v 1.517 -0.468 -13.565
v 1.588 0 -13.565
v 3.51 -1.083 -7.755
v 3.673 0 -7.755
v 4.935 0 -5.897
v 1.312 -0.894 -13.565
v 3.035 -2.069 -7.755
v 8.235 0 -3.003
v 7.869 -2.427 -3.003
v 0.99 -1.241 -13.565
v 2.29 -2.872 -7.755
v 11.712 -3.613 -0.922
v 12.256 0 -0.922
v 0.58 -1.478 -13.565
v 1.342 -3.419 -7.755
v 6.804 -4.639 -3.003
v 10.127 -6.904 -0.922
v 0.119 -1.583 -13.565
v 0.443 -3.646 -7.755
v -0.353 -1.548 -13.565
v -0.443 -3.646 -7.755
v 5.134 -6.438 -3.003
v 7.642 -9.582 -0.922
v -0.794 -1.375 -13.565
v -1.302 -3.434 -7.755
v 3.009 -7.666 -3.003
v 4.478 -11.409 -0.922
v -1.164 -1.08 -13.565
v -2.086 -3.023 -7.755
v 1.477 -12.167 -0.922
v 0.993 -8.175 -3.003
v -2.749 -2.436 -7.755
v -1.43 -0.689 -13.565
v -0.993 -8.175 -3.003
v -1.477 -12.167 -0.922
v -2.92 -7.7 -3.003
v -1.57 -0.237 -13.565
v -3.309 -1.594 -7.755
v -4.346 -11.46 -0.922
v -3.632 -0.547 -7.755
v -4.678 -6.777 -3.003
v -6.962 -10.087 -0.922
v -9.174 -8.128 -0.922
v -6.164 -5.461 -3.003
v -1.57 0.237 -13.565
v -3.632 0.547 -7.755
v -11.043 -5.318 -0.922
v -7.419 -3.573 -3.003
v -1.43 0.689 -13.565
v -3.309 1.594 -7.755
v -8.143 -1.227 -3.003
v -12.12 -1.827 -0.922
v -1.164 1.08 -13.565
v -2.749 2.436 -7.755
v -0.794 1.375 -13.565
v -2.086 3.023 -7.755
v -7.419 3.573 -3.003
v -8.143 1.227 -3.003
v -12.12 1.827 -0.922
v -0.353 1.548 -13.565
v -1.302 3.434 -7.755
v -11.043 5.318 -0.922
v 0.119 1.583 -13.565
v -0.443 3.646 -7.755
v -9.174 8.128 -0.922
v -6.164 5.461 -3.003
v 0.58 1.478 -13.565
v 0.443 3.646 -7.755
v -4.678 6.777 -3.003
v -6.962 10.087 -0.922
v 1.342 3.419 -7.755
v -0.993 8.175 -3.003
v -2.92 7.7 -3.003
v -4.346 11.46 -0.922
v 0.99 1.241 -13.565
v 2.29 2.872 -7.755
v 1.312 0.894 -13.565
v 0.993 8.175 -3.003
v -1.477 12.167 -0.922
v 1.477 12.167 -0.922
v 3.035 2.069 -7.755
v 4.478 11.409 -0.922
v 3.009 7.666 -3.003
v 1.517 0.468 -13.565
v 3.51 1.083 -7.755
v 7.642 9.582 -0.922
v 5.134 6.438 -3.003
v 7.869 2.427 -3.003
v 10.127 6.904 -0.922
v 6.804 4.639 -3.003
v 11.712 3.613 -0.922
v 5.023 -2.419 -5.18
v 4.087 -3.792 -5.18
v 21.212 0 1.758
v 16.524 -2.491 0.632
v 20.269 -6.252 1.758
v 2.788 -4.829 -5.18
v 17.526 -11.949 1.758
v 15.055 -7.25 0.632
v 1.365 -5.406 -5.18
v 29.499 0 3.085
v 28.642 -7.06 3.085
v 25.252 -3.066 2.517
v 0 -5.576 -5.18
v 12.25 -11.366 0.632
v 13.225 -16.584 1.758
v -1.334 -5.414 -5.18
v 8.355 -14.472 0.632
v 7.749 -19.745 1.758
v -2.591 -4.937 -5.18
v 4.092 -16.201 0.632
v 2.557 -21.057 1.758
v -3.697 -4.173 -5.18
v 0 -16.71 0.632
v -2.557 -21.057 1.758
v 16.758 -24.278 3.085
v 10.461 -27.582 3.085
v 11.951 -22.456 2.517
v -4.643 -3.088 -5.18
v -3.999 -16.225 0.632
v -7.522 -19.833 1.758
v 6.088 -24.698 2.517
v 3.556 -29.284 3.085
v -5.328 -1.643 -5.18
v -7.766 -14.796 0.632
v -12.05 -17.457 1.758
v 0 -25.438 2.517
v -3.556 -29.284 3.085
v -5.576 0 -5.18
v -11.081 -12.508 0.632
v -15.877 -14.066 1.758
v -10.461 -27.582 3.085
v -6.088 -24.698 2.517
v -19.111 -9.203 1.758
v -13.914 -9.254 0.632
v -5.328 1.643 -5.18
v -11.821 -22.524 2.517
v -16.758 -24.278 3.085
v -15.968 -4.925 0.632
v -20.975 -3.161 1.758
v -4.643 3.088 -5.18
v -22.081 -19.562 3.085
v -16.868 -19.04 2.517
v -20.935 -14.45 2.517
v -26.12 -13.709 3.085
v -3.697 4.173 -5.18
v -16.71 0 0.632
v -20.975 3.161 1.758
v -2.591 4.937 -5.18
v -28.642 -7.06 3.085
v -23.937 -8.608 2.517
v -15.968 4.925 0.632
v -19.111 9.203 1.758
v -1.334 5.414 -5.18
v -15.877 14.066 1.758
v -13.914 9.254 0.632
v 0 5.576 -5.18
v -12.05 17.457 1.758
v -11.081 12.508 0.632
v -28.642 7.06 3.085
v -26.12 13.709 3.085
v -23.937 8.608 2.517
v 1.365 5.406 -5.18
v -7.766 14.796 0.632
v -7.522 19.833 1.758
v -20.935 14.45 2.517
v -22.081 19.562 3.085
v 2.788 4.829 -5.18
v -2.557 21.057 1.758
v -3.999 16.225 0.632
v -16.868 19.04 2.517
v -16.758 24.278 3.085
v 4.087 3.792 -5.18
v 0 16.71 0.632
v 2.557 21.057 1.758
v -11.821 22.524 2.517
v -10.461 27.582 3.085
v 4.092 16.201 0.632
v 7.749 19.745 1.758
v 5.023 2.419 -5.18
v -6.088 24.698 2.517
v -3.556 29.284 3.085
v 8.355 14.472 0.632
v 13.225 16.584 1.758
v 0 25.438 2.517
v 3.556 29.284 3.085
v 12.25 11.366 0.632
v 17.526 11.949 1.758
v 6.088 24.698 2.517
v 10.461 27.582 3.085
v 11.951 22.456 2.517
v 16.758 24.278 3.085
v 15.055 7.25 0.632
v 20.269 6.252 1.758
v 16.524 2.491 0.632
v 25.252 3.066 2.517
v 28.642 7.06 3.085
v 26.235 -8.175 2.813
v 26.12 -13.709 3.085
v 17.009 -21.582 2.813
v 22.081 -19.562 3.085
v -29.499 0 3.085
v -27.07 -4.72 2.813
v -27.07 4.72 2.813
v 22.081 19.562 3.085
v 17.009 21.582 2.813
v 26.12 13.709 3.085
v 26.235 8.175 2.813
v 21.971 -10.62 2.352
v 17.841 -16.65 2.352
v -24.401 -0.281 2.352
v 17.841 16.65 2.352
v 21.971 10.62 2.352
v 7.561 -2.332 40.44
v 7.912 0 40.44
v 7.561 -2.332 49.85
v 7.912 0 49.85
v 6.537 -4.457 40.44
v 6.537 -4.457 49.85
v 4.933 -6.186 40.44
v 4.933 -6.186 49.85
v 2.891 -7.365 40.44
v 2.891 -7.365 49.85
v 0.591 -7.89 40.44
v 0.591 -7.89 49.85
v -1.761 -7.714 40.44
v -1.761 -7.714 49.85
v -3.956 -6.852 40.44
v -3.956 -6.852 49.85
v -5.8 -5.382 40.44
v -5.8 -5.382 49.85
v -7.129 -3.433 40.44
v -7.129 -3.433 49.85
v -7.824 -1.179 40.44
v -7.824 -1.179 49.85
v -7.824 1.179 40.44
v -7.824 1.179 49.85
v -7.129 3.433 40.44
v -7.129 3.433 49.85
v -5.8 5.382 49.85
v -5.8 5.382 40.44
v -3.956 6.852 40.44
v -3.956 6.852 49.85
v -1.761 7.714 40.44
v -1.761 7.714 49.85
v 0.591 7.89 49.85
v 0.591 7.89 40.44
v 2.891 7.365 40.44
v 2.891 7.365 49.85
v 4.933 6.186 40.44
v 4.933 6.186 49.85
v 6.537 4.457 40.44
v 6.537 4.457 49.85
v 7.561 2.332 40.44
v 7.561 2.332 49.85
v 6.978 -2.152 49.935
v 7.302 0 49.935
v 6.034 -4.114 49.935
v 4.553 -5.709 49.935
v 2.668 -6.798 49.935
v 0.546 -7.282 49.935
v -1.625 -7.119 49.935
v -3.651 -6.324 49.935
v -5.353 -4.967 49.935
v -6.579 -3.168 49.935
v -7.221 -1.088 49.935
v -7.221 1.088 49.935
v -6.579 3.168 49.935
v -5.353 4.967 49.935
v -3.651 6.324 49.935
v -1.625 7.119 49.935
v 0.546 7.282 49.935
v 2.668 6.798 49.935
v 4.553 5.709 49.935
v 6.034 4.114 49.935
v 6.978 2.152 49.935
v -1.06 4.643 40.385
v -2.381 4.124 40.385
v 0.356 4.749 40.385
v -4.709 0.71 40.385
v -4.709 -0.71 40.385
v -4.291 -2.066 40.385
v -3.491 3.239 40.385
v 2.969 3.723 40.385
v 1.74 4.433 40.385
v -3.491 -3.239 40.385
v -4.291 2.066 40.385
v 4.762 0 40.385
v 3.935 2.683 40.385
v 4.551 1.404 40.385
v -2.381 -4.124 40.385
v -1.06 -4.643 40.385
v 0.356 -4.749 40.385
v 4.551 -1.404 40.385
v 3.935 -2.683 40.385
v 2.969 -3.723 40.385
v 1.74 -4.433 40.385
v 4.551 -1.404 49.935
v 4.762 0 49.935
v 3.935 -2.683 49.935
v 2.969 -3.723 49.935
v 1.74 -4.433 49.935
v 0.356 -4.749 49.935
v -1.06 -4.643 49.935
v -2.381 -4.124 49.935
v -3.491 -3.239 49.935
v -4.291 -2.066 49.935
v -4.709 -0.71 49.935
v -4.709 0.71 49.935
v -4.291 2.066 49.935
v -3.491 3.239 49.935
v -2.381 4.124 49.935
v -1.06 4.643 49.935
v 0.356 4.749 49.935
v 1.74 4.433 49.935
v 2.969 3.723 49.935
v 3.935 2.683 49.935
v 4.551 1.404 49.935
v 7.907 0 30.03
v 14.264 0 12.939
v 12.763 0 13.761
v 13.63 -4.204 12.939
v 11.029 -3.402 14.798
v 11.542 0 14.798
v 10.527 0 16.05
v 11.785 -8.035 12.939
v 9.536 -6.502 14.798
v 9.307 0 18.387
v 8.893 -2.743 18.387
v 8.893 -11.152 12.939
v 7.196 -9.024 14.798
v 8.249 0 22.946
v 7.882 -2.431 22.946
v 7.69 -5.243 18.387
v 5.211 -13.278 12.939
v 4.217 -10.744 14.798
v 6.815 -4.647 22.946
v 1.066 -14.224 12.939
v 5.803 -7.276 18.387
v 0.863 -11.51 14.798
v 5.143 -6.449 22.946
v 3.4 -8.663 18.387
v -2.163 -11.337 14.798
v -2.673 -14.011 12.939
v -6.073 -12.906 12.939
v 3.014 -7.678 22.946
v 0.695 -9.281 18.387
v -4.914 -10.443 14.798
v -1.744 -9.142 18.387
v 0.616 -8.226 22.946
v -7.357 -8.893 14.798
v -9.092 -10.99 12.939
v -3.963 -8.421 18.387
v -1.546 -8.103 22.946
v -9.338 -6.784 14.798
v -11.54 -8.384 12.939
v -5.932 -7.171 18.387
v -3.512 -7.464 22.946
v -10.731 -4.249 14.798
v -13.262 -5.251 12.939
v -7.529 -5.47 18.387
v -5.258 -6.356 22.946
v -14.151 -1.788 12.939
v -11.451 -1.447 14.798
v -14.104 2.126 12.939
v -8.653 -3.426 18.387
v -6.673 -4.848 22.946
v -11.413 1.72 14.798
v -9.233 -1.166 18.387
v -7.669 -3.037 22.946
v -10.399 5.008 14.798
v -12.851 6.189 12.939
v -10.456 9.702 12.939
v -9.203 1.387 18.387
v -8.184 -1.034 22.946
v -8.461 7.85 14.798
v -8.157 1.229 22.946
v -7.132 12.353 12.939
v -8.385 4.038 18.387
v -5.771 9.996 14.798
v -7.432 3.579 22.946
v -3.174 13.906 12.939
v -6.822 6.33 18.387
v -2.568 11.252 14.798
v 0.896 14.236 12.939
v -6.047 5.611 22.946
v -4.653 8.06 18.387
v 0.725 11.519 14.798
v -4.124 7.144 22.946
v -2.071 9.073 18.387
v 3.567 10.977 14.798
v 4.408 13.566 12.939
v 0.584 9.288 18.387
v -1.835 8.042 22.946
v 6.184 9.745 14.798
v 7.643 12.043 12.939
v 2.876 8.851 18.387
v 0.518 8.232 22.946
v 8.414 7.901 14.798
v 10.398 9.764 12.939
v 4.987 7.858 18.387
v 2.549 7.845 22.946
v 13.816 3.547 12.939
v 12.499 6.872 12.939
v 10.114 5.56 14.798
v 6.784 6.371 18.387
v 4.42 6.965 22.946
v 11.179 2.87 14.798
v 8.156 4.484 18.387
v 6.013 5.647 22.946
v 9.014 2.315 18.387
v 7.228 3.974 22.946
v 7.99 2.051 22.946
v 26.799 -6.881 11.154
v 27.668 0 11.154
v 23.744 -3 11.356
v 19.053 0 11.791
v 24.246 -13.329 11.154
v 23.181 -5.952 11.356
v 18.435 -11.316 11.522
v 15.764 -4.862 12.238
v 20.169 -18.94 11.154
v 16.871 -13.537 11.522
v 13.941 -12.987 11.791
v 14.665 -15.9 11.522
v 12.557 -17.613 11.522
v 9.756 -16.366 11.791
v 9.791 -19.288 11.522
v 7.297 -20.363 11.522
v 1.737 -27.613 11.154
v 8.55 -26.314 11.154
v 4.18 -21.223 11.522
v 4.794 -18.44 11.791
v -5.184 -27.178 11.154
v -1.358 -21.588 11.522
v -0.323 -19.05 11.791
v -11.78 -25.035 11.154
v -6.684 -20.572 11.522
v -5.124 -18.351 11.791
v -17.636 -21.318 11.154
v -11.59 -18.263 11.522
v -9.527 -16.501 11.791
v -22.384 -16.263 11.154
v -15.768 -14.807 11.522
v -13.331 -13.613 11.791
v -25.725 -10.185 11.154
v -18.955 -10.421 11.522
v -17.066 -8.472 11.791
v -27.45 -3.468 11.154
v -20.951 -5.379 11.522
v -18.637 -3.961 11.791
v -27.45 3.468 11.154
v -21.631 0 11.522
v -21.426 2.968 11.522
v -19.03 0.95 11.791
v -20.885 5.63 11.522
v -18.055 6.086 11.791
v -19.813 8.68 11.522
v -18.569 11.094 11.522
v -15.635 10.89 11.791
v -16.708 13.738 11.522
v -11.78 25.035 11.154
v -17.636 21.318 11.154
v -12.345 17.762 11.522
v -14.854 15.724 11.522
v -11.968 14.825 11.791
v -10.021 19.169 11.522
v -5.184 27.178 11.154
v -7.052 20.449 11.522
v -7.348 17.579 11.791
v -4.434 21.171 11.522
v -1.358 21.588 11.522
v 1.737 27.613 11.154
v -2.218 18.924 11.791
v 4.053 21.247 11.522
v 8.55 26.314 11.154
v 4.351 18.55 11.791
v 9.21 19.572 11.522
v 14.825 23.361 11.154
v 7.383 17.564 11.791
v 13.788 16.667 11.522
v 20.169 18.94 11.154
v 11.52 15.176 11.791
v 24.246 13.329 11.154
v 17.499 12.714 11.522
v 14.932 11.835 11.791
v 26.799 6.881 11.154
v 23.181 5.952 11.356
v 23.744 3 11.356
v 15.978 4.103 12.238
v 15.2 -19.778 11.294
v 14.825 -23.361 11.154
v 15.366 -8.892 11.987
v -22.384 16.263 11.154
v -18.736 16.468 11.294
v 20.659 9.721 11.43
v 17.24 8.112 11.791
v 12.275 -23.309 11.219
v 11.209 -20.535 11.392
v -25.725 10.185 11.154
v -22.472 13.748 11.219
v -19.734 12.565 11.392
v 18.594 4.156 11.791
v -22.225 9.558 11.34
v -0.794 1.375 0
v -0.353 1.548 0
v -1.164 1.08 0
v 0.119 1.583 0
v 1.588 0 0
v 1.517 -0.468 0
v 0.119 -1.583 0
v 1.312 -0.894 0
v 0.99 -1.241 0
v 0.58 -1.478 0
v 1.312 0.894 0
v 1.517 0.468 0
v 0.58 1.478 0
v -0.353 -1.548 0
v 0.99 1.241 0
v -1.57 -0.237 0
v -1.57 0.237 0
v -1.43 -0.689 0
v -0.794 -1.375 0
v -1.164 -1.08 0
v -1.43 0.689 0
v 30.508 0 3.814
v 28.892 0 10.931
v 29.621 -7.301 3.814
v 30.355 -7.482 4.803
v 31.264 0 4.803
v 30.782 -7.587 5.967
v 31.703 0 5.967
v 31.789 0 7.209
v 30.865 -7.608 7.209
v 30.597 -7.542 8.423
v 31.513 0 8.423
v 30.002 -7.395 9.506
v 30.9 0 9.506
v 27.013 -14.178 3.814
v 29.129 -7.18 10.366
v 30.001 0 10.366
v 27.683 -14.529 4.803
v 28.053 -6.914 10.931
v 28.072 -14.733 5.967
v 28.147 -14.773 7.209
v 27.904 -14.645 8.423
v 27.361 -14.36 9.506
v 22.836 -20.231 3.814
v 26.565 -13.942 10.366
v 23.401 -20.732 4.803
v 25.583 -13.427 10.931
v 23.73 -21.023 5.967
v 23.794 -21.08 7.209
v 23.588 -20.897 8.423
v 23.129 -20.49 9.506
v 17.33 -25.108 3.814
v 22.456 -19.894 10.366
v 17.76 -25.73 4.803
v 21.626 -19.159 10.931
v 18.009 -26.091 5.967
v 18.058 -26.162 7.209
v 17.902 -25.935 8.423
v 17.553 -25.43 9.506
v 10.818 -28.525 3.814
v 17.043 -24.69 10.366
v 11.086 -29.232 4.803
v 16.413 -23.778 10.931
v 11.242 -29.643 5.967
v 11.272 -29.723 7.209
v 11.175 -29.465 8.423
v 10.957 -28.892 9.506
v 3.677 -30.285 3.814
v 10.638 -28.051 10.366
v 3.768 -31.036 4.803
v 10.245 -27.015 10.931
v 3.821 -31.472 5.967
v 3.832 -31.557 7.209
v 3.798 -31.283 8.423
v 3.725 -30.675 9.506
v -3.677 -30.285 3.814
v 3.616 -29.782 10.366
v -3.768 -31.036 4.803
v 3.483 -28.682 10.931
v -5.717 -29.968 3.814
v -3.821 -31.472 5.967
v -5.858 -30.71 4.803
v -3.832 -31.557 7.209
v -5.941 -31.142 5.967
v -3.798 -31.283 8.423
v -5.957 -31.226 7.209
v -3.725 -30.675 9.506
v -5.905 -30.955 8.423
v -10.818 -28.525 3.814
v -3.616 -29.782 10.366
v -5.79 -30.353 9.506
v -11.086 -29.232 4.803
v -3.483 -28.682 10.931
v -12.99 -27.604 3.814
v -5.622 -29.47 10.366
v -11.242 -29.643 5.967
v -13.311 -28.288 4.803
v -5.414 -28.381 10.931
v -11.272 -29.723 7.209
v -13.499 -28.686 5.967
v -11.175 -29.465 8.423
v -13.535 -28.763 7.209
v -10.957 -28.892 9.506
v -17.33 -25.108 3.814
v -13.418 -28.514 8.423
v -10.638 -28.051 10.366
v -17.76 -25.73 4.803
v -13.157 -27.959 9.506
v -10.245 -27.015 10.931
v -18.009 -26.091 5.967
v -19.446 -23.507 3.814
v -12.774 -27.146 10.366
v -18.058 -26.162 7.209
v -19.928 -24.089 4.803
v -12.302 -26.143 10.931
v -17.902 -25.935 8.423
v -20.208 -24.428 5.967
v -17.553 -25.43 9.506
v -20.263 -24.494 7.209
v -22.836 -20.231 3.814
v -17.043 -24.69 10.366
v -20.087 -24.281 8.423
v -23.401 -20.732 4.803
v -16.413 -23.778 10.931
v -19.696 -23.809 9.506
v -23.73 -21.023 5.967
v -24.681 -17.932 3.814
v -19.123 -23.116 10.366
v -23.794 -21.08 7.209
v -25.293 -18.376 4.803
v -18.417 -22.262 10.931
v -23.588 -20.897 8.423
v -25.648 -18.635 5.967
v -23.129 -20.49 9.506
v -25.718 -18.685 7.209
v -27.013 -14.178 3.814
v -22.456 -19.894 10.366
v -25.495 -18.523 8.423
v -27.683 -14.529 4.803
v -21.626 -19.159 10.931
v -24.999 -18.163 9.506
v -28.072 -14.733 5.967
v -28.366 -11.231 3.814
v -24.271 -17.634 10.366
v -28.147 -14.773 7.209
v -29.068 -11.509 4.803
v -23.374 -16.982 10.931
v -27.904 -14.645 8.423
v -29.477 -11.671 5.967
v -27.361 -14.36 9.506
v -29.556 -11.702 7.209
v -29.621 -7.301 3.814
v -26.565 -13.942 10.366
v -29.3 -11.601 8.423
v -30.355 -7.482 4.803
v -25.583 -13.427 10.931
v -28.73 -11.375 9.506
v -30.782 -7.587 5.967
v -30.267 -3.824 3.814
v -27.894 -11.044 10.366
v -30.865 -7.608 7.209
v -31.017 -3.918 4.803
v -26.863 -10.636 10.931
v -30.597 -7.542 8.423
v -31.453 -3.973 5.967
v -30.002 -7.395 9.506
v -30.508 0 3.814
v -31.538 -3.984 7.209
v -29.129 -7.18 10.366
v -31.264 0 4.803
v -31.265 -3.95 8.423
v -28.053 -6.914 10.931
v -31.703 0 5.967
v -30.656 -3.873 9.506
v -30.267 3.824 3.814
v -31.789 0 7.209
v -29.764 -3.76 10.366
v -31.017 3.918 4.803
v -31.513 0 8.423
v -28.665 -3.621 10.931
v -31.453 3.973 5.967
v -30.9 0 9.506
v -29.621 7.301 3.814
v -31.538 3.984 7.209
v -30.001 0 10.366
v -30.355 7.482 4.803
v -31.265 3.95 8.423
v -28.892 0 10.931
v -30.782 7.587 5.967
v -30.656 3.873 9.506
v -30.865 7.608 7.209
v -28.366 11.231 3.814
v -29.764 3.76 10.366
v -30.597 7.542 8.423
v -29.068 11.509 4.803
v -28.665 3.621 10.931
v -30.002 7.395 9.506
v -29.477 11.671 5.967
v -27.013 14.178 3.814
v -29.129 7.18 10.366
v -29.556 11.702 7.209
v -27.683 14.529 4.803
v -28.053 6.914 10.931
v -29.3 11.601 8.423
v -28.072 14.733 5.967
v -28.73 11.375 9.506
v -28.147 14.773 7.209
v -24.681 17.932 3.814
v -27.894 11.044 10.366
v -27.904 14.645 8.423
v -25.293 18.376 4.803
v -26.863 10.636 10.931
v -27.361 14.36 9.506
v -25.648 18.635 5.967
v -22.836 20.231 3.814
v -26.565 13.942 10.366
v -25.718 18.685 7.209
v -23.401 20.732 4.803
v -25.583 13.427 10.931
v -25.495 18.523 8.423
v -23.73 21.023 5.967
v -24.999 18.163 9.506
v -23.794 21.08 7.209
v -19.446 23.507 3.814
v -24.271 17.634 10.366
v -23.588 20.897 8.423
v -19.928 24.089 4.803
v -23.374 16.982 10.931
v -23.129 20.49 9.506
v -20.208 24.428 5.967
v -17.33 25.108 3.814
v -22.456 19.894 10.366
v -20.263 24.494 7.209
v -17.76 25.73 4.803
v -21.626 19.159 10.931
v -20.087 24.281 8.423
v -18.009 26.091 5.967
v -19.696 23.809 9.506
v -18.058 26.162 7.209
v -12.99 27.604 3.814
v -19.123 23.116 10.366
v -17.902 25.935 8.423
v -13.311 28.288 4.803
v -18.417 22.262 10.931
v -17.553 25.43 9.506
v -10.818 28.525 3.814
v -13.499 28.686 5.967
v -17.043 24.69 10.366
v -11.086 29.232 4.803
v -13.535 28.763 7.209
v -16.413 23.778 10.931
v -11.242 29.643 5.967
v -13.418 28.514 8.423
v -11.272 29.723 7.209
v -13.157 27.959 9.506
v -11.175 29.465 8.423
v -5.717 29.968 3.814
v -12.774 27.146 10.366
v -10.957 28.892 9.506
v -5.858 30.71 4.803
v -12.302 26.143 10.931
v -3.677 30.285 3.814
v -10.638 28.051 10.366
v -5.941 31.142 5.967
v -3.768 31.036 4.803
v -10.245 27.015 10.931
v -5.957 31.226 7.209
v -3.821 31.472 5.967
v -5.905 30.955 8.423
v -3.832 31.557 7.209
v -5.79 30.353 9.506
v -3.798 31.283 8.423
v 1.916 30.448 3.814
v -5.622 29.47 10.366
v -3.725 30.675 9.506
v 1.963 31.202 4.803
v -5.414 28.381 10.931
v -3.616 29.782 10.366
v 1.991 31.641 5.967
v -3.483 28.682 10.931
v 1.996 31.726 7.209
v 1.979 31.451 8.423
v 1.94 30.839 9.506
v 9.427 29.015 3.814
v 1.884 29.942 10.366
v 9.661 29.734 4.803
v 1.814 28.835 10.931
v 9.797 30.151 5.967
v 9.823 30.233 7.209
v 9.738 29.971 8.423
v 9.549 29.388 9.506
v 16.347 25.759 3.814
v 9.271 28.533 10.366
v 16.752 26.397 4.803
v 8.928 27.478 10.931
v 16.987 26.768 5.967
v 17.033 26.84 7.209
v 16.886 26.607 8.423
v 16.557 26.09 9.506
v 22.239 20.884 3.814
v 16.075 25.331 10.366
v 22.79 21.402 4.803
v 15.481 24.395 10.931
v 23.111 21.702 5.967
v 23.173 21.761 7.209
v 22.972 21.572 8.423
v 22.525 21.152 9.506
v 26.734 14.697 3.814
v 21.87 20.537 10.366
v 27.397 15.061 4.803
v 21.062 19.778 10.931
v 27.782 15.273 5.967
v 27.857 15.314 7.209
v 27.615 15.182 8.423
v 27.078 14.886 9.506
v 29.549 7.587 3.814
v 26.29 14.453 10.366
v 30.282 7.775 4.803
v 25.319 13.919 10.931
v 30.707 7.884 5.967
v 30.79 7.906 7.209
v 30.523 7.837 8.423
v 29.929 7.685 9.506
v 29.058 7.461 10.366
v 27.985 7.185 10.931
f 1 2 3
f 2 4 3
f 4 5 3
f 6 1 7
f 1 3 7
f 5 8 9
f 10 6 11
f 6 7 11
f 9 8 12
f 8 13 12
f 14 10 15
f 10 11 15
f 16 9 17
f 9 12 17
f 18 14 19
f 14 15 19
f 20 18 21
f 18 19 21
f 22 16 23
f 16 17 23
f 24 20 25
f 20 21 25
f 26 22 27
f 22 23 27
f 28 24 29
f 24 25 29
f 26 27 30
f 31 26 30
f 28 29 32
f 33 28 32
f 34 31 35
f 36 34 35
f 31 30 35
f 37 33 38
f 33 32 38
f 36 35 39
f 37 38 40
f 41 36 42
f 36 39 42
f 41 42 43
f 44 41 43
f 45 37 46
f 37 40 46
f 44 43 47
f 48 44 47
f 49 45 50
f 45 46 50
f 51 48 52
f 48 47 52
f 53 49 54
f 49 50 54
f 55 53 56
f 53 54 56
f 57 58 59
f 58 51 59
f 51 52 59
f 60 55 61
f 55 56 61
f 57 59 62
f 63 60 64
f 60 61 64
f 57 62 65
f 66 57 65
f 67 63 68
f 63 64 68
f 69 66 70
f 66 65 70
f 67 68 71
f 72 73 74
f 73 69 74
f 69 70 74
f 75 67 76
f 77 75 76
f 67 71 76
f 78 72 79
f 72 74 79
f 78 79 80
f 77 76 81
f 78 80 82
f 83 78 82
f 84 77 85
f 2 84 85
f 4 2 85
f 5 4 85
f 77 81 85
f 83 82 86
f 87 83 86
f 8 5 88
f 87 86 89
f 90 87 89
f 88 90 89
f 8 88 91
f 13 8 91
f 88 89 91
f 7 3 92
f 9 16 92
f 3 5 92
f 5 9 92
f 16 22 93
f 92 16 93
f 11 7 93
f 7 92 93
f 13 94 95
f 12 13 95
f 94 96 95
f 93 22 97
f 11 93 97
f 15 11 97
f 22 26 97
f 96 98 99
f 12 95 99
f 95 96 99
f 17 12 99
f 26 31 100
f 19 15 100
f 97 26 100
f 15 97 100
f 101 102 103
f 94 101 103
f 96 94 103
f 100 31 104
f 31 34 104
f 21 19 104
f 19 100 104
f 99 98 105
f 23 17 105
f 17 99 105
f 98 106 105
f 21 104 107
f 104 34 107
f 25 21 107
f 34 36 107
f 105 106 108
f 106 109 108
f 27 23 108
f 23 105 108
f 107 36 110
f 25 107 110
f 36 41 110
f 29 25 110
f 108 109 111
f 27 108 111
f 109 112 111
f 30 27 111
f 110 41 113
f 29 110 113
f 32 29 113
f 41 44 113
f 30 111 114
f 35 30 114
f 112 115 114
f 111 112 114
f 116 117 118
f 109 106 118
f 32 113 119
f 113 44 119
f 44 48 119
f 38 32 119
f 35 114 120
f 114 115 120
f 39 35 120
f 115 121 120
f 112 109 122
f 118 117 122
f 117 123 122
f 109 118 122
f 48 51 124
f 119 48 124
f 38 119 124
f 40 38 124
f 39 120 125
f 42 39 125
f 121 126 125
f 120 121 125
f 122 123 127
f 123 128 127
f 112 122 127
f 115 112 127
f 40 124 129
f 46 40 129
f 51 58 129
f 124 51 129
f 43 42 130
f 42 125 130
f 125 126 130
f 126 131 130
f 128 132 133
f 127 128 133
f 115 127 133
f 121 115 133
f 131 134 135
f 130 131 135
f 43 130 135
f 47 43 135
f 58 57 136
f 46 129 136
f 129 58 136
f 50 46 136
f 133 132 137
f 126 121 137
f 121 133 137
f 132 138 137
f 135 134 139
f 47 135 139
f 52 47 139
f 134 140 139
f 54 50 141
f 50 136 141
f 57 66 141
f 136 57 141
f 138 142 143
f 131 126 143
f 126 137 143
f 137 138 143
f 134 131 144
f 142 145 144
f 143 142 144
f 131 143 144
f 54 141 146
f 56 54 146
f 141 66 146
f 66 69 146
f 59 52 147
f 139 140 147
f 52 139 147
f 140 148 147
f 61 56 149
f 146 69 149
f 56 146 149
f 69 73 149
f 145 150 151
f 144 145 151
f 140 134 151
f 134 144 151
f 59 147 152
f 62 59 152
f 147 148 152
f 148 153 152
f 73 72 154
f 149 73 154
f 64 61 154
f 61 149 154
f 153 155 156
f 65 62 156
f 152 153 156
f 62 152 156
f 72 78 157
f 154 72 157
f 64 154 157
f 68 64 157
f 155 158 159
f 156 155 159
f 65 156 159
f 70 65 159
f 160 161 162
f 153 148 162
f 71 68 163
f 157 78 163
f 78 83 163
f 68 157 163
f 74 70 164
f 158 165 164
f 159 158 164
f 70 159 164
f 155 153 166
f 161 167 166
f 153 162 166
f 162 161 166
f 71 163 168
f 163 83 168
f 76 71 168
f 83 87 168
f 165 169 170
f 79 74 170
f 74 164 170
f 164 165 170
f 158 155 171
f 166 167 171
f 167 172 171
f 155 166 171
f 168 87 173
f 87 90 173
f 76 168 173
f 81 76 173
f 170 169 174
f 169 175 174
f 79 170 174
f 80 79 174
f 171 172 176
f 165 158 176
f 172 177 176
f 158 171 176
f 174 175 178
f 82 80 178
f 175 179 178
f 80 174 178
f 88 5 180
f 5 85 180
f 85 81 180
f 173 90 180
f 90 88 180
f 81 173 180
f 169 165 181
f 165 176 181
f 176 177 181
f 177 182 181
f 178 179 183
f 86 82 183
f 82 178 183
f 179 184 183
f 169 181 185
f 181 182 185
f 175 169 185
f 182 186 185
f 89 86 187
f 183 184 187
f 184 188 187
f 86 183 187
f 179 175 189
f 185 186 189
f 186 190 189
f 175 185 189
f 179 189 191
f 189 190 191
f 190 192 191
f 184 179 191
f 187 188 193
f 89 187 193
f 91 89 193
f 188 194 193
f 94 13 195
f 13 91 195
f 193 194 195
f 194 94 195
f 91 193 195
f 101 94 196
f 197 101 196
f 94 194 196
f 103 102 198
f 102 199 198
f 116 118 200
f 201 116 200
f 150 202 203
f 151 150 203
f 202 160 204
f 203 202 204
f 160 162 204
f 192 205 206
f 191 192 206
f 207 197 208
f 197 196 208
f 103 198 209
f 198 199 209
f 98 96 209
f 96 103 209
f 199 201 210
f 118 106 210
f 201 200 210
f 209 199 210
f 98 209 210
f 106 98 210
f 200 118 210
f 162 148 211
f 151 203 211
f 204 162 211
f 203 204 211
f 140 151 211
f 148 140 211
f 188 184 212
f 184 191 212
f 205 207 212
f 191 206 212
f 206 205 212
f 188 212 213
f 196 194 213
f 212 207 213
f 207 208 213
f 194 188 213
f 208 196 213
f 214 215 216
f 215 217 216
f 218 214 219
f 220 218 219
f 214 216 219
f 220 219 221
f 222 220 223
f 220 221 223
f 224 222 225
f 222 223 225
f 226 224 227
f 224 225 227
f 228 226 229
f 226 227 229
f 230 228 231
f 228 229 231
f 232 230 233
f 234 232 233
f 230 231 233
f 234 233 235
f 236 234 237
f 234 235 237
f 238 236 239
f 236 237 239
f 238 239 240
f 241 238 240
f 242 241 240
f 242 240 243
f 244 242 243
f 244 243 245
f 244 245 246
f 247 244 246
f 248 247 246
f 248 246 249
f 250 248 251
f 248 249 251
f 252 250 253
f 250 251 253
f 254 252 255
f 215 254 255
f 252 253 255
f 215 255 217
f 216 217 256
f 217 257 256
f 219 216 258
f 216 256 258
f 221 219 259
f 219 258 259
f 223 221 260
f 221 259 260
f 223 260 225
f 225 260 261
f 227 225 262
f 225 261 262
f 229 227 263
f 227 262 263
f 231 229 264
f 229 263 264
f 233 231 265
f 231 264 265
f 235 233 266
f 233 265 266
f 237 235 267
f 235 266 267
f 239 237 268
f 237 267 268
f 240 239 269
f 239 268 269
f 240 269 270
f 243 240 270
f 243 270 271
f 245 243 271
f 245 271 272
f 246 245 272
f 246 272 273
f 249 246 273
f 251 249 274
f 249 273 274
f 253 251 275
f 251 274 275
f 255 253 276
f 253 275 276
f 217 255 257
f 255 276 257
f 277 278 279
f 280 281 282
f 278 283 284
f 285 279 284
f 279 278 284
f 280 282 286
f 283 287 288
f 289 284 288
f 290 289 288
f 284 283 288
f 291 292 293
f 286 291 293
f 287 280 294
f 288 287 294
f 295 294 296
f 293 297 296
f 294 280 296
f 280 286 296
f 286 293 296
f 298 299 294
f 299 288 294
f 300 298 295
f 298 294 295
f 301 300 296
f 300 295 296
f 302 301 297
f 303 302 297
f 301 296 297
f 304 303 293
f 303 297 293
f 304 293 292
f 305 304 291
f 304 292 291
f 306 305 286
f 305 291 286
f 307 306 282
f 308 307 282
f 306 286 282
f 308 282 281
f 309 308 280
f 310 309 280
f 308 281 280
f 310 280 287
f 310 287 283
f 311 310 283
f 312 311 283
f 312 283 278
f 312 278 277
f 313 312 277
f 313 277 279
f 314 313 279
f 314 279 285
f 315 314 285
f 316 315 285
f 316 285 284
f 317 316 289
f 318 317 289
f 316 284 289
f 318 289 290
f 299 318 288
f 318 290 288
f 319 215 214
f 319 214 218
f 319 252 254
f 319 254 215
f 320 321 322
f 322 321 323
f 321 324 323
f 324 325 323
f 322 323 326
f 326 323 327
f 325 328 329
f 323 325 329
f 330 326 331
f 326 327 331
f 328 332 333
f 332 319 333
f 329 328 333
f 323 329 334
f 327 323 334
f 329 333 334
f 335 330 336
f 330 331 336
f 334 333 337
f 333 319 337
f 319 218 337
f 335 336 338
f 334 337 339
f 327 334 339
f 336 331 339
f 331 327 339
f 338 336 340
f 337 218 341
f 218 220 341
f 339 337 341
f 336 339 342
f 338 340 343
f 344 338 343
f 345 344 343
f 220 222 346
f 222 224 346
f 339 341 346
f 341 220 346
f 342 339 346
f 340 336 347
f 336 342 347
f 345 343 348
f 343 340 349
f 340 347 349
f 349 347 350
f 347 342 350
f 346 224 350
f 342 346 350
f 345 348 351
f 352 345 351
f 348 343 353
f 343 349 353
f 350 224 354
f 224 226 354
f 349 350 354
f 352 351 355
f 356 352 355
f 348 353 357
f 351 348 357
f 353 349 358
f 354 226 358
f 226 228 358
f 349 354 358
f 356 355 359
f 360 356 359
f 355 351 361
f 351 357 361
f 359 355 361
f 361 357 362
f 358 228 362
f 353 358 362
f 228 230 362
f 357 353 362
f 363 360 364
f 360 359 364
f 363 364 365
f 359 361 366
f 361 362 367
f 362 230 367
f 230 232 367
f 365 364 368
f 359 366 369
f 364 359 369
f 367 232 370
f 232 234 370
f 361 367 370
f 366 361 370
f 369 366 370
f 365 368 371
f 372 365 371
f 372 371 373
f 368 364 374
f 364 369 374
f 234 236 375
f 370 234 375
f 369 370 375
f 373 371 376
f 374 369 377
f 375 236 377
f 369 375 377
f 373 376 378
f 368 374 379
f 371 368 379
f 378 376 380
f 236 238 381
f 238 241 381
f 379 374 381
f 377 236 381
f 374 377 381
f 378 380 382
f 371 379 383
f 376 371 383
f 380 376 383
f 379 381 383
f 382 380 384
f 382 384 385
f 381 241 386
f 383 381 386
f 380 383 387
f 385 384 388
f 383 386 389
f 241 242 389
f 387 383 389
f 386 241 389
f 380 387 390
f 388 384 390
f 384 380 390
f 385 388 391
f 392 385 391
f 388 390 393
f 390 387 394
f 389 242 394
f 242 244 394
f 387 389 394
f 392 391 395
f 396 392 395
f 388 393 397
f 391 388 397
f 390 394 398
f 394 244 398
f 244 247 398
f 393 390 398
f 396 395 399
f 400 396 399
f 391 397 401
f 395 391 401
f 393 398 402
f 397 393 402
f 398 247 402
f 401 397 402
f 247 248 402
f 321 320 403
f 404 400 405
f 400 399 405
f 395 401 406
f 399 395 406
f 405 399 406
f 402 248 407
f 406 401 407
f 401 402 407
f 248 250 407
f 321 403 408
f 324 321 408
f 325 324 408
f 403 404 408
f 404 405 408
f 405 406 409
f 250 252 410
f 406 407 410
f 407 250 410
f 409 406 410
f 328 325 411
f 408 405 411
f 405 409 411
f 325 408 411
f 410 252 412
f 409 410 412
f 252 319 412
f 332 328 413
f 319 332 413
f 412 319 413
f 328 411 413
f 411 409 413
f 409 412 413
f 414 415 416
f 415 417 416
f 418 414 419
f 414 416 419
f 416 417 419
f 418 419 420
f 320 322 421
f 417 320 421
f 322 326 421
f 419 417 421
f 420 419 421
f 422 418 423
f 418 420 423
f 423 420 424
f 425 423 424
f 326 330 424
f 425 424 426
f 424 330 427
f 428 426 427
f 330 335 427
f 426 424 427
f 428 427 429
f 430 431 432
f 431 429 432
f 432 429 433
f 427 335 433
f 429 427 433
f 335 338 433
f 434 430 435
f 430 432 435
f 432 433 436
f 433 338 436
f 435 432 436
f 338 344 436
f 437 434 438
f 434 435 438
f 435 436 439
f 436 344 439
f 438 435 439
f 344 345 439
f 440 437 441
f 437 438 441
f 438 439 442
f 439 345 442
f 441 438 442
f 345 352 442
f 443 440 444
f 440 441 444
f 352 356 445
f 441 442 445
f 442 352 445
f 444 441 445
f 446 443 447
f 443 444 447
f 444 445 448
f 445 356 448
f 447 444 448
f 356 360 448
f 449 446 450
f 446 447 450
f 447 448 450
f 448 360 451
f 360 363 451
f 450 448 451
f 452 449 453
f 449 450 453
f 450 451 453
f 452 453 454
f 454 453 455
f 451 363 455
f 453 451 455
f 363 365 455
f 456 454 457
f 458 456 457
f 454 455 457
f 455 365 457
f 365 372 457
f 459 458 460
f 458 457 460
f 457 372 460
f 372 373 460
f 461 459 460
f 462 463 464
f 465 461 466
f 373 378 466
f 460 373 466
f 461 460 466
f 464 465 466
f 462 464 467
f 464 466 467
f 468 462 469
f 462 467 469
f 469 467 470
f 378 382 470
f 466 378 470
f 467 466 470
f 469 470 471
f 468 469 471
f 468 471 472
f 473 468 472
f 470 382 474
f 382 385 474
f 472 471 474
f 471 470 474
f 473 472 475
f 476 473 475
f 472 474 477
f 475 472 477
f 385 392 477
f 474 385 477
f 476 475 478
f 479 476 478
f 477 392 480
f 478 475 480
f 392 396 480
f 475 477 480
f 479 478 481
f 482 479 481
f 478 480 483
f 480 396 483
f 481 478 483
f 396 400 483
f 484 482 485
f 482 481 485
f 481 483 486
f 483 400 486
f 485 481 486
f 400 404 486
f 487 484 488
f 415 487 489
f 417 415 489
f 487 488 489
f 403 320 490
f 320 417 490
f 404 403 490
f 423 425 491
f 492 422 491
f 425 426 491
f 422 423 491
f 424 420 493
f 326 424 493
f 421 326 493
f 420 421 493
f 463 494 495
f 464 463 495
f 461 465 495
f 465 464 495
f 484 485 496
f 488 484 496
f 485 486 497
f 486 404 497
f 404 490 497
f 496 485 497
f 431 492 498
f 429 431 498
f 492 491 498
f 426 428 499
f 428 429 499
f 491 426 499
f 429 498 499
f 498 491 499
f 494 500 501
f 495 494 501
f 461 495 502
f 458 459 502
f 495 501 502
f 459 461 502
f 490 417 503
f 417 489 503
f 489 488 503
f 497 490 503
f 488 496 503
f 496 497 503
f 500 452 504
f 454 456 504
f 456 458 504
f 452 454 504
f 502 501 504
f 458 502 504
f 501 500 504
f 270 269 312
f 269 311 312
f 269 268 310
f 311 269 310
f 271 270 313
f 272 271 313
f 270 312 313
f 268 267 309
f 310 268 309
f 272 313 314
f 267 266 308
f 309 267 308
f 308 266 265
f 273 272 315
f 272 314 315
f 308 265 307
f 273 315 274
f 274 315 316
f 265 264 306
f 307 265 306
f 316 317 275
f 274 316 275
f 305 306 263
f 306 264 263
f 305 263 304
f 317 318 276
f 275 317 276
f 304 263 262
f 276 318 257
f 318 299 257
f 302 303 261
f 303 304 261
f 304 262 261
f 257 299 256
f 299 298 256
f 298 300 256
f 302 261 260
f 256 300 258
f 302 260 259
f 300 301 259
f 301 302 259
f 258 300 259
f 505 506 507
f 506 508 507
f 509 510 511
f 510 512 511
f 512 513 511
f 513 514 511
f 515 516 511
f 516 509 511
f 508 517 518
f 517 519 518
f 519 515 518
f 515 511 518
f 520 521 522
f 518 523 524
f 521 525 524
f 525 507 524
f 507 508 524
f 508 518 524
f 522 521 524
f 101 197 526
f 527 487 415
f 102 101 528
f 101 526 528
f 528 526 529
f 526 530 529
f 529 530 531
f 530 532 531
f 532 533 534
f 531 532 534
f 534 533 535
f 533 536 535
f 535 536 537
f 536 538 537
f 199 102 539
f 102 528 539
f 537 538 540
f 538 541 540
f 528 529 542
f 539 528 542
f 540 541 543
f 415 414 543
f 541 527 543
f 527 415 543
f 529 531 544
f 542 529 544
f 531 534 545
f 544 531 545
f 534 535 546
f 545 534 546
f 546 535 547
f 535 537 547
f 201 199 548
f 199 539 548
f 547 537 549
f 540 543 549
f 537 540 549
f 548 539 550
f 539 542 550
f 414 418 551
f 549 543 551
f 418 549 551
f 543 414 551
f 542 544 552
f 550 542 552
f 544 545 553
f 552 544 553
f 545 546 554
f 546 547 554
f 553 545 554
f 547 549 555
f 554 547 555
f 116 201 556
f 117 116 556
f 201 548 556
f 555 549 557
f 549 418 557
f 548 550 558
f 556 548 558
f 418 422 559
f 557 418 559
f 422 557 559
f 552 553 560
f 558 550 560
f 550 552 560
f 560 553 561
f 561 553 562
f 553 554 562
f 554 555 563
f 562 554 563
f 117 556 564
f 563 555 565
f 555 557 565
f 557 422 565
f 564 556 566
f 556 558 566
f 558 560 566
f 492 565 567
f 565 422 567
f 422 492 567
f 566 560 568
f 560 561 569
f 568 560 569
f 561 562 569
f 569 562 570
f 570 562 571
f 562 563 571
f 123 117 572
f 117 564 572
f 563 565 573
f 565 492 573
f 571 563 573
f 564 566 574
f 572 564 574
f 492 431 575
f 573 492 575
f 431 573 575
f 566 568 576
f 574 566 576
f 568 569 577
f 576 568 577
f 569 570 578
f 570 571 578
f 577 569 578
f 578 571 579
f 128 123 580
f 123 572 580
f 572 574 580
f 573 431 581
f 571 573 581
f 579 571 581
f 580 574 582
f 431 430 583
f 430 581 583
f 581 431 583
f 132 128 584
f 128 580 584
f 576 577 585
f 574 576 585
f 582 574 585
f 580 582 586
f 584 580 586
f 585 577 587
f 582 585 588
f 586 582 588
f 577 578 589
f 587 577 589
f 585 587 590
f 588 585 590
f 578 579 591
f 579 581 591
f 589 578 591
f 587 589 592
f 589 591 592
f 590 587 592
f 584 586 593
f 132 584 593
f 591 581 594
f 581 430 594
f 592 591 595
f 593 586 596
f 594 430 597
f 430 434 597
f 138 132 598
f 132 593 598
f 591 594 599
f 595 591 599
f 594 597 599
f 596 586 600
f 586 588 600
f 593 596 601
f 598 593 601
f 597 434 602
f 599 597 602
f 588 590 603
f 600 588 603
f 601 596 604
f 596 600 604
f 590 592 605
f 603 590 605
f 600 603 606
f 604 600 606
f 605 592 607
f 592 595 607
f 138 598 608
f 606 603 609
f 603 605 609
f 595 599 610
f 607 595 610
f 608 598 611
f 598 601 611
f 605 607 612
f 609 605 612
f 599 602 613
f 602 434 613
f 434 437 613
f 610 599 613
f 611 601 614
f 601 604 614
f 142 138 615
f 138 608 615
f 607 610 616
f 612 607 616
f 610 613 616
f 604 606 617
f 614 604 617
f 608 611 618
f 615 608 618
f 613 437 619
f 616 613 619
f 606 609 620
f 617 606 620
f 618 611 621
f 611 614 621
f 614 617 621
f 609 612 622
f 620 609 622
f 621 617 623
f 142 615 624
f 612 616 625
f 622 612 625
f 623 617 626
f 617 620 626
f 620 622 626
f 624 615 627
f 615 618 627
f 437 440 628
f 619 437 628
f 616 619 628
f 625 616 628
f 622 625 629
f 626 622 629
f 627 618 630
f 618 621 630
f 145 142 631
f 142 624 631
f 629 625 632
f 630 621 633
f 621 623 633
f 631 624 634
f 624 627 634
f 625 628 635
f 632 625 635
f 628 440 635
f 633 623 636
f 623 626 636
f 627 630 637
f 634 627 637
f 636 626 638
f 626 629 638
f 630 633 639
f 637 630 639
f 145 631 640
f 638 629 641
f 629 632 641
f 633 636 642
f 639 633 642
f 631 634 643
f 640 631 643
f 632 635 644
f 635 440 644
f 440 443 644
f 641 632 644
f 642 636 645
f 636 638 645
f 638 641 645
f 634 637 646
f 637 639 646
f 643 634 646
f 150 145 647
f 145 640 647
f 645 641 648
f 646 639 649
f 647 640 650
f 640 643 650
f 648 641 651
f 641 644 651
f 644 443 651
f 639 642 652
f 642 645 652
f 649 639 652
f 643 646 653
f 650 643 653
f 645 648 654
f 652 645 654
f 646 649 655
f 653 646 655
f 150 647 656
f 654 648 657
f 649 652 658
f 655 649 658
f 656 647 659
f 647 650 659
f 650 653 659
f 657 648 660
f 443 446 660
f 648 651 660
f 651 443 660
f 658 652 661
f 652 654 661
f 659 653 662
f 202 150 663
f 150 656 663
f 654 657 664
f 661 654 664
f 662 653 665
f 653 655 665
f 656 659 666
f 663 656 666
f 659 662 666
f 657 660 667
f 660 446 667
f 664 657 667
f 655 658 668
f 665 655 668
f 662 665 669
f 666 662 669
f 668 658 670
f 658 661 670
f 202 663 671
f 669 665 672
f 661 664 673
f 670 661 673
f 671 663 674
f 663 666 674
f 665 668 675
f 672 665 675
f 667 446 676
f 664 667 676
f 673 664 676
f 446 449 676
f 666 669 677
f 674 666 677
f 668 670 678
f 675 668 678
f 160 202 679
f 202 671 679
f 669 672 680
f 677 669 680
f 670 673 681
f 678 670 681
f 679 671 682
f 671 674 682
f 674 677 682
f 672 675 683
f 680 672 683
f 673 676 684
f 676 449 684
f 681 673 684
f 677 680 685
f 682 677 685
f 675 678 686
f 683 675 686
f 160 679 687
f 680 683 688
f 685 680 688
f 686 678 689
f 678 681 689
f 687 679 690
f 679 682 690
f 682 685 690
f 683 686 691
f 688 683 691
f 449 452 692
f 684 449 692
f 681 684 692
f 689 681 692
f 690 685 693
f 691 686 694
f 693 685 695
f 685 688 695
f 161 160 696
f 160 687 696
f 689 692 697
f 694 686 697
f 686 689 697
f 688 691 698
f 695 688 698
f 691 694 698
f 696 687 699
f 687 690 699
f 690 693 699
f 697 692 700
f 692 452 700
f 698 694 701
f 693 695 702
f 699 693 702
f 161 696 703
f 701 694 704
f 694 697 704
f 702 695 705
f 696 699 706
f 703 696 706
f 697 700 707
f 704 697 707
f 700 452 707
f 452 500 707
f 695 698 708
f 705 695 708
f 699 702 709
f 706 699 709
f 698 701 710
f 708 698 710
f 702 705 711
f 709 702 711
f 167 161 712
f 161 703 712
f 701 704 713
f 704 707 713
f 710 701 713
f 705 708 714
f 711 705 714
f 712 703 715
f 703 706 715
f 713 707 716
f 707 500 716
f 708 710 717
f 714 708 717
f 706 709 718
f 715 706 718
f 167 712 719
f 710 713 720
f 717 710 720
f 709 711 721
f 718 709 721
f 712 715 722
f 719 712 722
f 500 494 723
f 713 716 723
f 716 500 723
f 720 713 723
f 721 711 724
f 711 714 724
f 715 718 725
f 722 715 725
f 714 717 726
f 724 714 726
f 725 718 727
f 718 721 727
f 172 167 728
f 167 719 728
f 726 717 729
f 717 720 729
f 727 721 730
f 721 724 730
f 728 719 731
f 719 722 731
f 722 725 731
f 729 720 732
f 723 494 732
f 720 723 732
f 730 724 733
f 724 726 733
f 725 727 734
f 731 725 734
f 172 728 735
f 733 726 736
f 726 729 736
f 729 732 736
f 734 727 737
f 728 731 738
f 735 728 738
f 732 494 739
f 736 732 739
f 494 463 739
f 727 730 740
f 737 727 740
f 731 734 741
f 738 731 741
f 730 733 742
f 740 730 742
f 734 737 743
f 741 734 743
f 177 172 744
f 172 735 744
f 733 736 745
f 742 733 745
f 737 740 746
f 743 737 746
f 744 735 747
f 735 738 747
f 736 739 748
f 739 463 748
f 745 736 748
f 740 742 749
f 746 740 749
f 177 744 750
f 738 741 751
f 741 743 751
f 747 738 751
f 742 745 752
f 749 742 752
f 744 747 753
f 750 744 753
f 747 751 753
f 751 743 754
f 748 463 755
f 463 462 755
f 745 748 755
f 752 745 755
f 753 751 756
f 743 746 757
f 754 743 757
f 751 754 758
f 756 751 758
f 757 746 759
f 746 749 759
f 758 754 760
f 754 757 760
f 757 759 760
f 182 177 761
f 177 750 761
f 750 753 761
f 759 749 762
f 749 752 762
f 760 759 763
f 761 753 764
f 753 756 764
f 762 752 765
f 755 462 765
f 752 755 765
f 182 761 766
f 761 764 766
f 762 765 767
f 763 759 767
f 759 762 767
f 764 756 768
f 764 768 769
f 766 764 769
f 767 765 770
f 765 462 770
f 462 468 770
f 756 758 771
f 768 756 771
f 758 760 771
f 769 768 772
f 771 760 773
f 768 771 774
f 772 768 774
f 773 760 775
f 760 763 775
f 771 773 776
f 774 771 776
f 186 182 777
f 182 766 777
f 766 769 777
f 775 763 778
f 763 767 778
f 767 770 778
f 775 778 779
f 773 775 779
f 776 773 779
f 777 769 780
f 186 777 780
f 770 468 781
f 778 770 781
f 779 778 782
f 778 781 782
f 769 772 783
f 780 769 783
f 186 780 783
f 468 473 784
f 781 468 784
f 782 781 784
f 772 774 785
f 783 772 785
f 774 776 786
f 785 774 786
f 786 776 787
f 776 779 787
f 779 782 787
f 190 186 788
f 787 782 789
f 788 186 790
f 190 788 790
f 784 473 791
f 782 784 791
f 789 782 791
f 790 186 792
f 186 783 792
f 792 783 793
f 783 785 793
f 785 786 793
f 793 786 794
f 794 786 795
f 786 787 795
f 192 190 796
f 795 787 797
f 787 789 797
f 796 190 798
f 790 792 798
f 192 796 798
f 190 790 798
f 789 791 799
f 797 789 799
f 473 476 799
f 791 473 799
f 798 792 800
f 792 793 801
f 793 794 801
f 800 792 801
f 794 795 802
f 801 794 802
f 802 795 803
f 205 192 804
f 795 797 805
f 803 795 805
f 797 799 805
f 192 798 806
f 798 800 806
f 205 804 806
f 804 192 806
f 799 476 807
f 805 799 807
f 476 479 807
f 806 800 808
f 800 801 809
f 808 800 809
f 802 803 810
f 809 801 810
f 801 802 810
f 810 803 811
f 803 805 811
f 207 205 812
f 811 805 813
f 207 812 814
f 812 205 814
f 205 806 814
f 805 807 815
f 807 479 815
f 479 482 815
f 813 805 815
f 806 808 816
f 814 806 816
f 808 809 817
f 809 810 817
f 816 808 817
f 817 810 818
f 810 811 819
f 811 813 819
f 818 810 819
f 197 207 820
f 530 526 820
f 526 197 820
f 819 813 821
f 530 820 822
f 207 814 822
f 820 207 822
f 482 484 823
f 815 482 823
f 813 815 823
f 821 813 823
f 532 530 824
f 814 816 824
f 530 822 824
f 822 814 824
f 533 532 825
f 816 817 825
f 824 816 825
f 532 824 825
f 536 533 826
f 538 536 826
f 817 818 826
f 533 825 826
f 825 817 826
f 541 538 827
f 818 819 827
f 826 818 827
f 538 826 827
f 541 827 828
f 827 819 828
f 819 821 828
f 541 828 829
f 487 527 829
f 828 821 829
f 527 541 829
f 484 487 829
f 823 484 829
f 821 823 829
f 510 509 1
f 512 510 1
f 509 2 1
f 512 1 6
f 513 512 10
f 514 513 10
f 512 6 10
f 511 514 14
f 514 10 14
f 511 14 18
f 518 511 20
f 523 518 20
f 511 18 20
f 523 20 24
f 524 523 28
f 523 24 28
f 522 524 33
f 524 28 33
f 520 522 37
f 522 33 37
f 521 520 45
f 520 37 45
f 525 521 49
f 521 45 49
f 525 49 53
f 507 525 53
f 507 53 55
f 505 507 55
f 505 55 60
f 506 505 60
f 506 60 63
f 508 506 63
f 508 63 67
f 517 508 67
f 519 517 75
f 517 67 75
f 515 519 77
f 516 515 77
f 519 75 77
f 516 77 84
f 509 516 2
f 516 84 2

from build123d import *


with BuildPart() as f1:
    # F0 (on Front) → F1 (revolve)
    with BuildSketch(Plane.XZ):
        with BuildLine():
            Line((7.3025, 49.9351416626), (4.7625, 49.9351416626))
            Line((4.7625, 49.9351416626), (4.7625, 40.3847416626))
            Line((4.7625, 40.3847416626), (0, 40.3847416626))
            Line((0, 40.3847416626), (0, 6.8790409714))
            Line((0, 6.8790409714), (0, 0))
            Line((0, 0), (1.5875, 0))
            Line((1.5875, 0), (1.5875, -13.5648583374))
            add(Edge.make_bspline(
                [(1.5875, -13.5648583374), (2.197826211, -11.343300191), (3.4507124513, -6.7828543454), (9.3827411245, -1.5374513186), (20.2289245805, 1.8522698942), (26.5021930747, 2.6866479243), (29.49943192, 3.0852966105)],
                knots=[0, 0, 0, 0, 0.221273734, 0.454233837, 0.7392441363, 1, 1, 1, 1], degree=3))
            ThreePointArc((29.49943192, 3.0852966105), (31.695299556, 7.825879337), (27.6678465307, 11.1537287012))
            add(Edge.make_bspline(
                [(27.6678465307, 11.1537287012), (26.2216893508, 11.2234465231), (22.8965880234, 11.3837464036), (14.647665222, 12.1059748712), (10.4700064296, 15.3881169493), (7.8159786412, 21.4408473295), (7.9325491577, 33.2367031168), (7.91835801, 38.2405007706), (7.9121207818, 40.4397472739)],
                knots=[0, 0, 0, 0, 0.1378285483, 0.3169046183, 0.456687677, 0.6146757849, 0.8306440445, 1, 1, 1, 1], degree=3))
            Line((7.9121207818, 40.4397472739), (7.9121207818, 49.8497076333))
            Line((7.9121207818, 49.8497076333), (7.3025, 49.9351416626))
        make_face()
    revolve(axis=Axis((0, 0, 20.1923708313), (0, 0, -1)))


solid = f1.part
